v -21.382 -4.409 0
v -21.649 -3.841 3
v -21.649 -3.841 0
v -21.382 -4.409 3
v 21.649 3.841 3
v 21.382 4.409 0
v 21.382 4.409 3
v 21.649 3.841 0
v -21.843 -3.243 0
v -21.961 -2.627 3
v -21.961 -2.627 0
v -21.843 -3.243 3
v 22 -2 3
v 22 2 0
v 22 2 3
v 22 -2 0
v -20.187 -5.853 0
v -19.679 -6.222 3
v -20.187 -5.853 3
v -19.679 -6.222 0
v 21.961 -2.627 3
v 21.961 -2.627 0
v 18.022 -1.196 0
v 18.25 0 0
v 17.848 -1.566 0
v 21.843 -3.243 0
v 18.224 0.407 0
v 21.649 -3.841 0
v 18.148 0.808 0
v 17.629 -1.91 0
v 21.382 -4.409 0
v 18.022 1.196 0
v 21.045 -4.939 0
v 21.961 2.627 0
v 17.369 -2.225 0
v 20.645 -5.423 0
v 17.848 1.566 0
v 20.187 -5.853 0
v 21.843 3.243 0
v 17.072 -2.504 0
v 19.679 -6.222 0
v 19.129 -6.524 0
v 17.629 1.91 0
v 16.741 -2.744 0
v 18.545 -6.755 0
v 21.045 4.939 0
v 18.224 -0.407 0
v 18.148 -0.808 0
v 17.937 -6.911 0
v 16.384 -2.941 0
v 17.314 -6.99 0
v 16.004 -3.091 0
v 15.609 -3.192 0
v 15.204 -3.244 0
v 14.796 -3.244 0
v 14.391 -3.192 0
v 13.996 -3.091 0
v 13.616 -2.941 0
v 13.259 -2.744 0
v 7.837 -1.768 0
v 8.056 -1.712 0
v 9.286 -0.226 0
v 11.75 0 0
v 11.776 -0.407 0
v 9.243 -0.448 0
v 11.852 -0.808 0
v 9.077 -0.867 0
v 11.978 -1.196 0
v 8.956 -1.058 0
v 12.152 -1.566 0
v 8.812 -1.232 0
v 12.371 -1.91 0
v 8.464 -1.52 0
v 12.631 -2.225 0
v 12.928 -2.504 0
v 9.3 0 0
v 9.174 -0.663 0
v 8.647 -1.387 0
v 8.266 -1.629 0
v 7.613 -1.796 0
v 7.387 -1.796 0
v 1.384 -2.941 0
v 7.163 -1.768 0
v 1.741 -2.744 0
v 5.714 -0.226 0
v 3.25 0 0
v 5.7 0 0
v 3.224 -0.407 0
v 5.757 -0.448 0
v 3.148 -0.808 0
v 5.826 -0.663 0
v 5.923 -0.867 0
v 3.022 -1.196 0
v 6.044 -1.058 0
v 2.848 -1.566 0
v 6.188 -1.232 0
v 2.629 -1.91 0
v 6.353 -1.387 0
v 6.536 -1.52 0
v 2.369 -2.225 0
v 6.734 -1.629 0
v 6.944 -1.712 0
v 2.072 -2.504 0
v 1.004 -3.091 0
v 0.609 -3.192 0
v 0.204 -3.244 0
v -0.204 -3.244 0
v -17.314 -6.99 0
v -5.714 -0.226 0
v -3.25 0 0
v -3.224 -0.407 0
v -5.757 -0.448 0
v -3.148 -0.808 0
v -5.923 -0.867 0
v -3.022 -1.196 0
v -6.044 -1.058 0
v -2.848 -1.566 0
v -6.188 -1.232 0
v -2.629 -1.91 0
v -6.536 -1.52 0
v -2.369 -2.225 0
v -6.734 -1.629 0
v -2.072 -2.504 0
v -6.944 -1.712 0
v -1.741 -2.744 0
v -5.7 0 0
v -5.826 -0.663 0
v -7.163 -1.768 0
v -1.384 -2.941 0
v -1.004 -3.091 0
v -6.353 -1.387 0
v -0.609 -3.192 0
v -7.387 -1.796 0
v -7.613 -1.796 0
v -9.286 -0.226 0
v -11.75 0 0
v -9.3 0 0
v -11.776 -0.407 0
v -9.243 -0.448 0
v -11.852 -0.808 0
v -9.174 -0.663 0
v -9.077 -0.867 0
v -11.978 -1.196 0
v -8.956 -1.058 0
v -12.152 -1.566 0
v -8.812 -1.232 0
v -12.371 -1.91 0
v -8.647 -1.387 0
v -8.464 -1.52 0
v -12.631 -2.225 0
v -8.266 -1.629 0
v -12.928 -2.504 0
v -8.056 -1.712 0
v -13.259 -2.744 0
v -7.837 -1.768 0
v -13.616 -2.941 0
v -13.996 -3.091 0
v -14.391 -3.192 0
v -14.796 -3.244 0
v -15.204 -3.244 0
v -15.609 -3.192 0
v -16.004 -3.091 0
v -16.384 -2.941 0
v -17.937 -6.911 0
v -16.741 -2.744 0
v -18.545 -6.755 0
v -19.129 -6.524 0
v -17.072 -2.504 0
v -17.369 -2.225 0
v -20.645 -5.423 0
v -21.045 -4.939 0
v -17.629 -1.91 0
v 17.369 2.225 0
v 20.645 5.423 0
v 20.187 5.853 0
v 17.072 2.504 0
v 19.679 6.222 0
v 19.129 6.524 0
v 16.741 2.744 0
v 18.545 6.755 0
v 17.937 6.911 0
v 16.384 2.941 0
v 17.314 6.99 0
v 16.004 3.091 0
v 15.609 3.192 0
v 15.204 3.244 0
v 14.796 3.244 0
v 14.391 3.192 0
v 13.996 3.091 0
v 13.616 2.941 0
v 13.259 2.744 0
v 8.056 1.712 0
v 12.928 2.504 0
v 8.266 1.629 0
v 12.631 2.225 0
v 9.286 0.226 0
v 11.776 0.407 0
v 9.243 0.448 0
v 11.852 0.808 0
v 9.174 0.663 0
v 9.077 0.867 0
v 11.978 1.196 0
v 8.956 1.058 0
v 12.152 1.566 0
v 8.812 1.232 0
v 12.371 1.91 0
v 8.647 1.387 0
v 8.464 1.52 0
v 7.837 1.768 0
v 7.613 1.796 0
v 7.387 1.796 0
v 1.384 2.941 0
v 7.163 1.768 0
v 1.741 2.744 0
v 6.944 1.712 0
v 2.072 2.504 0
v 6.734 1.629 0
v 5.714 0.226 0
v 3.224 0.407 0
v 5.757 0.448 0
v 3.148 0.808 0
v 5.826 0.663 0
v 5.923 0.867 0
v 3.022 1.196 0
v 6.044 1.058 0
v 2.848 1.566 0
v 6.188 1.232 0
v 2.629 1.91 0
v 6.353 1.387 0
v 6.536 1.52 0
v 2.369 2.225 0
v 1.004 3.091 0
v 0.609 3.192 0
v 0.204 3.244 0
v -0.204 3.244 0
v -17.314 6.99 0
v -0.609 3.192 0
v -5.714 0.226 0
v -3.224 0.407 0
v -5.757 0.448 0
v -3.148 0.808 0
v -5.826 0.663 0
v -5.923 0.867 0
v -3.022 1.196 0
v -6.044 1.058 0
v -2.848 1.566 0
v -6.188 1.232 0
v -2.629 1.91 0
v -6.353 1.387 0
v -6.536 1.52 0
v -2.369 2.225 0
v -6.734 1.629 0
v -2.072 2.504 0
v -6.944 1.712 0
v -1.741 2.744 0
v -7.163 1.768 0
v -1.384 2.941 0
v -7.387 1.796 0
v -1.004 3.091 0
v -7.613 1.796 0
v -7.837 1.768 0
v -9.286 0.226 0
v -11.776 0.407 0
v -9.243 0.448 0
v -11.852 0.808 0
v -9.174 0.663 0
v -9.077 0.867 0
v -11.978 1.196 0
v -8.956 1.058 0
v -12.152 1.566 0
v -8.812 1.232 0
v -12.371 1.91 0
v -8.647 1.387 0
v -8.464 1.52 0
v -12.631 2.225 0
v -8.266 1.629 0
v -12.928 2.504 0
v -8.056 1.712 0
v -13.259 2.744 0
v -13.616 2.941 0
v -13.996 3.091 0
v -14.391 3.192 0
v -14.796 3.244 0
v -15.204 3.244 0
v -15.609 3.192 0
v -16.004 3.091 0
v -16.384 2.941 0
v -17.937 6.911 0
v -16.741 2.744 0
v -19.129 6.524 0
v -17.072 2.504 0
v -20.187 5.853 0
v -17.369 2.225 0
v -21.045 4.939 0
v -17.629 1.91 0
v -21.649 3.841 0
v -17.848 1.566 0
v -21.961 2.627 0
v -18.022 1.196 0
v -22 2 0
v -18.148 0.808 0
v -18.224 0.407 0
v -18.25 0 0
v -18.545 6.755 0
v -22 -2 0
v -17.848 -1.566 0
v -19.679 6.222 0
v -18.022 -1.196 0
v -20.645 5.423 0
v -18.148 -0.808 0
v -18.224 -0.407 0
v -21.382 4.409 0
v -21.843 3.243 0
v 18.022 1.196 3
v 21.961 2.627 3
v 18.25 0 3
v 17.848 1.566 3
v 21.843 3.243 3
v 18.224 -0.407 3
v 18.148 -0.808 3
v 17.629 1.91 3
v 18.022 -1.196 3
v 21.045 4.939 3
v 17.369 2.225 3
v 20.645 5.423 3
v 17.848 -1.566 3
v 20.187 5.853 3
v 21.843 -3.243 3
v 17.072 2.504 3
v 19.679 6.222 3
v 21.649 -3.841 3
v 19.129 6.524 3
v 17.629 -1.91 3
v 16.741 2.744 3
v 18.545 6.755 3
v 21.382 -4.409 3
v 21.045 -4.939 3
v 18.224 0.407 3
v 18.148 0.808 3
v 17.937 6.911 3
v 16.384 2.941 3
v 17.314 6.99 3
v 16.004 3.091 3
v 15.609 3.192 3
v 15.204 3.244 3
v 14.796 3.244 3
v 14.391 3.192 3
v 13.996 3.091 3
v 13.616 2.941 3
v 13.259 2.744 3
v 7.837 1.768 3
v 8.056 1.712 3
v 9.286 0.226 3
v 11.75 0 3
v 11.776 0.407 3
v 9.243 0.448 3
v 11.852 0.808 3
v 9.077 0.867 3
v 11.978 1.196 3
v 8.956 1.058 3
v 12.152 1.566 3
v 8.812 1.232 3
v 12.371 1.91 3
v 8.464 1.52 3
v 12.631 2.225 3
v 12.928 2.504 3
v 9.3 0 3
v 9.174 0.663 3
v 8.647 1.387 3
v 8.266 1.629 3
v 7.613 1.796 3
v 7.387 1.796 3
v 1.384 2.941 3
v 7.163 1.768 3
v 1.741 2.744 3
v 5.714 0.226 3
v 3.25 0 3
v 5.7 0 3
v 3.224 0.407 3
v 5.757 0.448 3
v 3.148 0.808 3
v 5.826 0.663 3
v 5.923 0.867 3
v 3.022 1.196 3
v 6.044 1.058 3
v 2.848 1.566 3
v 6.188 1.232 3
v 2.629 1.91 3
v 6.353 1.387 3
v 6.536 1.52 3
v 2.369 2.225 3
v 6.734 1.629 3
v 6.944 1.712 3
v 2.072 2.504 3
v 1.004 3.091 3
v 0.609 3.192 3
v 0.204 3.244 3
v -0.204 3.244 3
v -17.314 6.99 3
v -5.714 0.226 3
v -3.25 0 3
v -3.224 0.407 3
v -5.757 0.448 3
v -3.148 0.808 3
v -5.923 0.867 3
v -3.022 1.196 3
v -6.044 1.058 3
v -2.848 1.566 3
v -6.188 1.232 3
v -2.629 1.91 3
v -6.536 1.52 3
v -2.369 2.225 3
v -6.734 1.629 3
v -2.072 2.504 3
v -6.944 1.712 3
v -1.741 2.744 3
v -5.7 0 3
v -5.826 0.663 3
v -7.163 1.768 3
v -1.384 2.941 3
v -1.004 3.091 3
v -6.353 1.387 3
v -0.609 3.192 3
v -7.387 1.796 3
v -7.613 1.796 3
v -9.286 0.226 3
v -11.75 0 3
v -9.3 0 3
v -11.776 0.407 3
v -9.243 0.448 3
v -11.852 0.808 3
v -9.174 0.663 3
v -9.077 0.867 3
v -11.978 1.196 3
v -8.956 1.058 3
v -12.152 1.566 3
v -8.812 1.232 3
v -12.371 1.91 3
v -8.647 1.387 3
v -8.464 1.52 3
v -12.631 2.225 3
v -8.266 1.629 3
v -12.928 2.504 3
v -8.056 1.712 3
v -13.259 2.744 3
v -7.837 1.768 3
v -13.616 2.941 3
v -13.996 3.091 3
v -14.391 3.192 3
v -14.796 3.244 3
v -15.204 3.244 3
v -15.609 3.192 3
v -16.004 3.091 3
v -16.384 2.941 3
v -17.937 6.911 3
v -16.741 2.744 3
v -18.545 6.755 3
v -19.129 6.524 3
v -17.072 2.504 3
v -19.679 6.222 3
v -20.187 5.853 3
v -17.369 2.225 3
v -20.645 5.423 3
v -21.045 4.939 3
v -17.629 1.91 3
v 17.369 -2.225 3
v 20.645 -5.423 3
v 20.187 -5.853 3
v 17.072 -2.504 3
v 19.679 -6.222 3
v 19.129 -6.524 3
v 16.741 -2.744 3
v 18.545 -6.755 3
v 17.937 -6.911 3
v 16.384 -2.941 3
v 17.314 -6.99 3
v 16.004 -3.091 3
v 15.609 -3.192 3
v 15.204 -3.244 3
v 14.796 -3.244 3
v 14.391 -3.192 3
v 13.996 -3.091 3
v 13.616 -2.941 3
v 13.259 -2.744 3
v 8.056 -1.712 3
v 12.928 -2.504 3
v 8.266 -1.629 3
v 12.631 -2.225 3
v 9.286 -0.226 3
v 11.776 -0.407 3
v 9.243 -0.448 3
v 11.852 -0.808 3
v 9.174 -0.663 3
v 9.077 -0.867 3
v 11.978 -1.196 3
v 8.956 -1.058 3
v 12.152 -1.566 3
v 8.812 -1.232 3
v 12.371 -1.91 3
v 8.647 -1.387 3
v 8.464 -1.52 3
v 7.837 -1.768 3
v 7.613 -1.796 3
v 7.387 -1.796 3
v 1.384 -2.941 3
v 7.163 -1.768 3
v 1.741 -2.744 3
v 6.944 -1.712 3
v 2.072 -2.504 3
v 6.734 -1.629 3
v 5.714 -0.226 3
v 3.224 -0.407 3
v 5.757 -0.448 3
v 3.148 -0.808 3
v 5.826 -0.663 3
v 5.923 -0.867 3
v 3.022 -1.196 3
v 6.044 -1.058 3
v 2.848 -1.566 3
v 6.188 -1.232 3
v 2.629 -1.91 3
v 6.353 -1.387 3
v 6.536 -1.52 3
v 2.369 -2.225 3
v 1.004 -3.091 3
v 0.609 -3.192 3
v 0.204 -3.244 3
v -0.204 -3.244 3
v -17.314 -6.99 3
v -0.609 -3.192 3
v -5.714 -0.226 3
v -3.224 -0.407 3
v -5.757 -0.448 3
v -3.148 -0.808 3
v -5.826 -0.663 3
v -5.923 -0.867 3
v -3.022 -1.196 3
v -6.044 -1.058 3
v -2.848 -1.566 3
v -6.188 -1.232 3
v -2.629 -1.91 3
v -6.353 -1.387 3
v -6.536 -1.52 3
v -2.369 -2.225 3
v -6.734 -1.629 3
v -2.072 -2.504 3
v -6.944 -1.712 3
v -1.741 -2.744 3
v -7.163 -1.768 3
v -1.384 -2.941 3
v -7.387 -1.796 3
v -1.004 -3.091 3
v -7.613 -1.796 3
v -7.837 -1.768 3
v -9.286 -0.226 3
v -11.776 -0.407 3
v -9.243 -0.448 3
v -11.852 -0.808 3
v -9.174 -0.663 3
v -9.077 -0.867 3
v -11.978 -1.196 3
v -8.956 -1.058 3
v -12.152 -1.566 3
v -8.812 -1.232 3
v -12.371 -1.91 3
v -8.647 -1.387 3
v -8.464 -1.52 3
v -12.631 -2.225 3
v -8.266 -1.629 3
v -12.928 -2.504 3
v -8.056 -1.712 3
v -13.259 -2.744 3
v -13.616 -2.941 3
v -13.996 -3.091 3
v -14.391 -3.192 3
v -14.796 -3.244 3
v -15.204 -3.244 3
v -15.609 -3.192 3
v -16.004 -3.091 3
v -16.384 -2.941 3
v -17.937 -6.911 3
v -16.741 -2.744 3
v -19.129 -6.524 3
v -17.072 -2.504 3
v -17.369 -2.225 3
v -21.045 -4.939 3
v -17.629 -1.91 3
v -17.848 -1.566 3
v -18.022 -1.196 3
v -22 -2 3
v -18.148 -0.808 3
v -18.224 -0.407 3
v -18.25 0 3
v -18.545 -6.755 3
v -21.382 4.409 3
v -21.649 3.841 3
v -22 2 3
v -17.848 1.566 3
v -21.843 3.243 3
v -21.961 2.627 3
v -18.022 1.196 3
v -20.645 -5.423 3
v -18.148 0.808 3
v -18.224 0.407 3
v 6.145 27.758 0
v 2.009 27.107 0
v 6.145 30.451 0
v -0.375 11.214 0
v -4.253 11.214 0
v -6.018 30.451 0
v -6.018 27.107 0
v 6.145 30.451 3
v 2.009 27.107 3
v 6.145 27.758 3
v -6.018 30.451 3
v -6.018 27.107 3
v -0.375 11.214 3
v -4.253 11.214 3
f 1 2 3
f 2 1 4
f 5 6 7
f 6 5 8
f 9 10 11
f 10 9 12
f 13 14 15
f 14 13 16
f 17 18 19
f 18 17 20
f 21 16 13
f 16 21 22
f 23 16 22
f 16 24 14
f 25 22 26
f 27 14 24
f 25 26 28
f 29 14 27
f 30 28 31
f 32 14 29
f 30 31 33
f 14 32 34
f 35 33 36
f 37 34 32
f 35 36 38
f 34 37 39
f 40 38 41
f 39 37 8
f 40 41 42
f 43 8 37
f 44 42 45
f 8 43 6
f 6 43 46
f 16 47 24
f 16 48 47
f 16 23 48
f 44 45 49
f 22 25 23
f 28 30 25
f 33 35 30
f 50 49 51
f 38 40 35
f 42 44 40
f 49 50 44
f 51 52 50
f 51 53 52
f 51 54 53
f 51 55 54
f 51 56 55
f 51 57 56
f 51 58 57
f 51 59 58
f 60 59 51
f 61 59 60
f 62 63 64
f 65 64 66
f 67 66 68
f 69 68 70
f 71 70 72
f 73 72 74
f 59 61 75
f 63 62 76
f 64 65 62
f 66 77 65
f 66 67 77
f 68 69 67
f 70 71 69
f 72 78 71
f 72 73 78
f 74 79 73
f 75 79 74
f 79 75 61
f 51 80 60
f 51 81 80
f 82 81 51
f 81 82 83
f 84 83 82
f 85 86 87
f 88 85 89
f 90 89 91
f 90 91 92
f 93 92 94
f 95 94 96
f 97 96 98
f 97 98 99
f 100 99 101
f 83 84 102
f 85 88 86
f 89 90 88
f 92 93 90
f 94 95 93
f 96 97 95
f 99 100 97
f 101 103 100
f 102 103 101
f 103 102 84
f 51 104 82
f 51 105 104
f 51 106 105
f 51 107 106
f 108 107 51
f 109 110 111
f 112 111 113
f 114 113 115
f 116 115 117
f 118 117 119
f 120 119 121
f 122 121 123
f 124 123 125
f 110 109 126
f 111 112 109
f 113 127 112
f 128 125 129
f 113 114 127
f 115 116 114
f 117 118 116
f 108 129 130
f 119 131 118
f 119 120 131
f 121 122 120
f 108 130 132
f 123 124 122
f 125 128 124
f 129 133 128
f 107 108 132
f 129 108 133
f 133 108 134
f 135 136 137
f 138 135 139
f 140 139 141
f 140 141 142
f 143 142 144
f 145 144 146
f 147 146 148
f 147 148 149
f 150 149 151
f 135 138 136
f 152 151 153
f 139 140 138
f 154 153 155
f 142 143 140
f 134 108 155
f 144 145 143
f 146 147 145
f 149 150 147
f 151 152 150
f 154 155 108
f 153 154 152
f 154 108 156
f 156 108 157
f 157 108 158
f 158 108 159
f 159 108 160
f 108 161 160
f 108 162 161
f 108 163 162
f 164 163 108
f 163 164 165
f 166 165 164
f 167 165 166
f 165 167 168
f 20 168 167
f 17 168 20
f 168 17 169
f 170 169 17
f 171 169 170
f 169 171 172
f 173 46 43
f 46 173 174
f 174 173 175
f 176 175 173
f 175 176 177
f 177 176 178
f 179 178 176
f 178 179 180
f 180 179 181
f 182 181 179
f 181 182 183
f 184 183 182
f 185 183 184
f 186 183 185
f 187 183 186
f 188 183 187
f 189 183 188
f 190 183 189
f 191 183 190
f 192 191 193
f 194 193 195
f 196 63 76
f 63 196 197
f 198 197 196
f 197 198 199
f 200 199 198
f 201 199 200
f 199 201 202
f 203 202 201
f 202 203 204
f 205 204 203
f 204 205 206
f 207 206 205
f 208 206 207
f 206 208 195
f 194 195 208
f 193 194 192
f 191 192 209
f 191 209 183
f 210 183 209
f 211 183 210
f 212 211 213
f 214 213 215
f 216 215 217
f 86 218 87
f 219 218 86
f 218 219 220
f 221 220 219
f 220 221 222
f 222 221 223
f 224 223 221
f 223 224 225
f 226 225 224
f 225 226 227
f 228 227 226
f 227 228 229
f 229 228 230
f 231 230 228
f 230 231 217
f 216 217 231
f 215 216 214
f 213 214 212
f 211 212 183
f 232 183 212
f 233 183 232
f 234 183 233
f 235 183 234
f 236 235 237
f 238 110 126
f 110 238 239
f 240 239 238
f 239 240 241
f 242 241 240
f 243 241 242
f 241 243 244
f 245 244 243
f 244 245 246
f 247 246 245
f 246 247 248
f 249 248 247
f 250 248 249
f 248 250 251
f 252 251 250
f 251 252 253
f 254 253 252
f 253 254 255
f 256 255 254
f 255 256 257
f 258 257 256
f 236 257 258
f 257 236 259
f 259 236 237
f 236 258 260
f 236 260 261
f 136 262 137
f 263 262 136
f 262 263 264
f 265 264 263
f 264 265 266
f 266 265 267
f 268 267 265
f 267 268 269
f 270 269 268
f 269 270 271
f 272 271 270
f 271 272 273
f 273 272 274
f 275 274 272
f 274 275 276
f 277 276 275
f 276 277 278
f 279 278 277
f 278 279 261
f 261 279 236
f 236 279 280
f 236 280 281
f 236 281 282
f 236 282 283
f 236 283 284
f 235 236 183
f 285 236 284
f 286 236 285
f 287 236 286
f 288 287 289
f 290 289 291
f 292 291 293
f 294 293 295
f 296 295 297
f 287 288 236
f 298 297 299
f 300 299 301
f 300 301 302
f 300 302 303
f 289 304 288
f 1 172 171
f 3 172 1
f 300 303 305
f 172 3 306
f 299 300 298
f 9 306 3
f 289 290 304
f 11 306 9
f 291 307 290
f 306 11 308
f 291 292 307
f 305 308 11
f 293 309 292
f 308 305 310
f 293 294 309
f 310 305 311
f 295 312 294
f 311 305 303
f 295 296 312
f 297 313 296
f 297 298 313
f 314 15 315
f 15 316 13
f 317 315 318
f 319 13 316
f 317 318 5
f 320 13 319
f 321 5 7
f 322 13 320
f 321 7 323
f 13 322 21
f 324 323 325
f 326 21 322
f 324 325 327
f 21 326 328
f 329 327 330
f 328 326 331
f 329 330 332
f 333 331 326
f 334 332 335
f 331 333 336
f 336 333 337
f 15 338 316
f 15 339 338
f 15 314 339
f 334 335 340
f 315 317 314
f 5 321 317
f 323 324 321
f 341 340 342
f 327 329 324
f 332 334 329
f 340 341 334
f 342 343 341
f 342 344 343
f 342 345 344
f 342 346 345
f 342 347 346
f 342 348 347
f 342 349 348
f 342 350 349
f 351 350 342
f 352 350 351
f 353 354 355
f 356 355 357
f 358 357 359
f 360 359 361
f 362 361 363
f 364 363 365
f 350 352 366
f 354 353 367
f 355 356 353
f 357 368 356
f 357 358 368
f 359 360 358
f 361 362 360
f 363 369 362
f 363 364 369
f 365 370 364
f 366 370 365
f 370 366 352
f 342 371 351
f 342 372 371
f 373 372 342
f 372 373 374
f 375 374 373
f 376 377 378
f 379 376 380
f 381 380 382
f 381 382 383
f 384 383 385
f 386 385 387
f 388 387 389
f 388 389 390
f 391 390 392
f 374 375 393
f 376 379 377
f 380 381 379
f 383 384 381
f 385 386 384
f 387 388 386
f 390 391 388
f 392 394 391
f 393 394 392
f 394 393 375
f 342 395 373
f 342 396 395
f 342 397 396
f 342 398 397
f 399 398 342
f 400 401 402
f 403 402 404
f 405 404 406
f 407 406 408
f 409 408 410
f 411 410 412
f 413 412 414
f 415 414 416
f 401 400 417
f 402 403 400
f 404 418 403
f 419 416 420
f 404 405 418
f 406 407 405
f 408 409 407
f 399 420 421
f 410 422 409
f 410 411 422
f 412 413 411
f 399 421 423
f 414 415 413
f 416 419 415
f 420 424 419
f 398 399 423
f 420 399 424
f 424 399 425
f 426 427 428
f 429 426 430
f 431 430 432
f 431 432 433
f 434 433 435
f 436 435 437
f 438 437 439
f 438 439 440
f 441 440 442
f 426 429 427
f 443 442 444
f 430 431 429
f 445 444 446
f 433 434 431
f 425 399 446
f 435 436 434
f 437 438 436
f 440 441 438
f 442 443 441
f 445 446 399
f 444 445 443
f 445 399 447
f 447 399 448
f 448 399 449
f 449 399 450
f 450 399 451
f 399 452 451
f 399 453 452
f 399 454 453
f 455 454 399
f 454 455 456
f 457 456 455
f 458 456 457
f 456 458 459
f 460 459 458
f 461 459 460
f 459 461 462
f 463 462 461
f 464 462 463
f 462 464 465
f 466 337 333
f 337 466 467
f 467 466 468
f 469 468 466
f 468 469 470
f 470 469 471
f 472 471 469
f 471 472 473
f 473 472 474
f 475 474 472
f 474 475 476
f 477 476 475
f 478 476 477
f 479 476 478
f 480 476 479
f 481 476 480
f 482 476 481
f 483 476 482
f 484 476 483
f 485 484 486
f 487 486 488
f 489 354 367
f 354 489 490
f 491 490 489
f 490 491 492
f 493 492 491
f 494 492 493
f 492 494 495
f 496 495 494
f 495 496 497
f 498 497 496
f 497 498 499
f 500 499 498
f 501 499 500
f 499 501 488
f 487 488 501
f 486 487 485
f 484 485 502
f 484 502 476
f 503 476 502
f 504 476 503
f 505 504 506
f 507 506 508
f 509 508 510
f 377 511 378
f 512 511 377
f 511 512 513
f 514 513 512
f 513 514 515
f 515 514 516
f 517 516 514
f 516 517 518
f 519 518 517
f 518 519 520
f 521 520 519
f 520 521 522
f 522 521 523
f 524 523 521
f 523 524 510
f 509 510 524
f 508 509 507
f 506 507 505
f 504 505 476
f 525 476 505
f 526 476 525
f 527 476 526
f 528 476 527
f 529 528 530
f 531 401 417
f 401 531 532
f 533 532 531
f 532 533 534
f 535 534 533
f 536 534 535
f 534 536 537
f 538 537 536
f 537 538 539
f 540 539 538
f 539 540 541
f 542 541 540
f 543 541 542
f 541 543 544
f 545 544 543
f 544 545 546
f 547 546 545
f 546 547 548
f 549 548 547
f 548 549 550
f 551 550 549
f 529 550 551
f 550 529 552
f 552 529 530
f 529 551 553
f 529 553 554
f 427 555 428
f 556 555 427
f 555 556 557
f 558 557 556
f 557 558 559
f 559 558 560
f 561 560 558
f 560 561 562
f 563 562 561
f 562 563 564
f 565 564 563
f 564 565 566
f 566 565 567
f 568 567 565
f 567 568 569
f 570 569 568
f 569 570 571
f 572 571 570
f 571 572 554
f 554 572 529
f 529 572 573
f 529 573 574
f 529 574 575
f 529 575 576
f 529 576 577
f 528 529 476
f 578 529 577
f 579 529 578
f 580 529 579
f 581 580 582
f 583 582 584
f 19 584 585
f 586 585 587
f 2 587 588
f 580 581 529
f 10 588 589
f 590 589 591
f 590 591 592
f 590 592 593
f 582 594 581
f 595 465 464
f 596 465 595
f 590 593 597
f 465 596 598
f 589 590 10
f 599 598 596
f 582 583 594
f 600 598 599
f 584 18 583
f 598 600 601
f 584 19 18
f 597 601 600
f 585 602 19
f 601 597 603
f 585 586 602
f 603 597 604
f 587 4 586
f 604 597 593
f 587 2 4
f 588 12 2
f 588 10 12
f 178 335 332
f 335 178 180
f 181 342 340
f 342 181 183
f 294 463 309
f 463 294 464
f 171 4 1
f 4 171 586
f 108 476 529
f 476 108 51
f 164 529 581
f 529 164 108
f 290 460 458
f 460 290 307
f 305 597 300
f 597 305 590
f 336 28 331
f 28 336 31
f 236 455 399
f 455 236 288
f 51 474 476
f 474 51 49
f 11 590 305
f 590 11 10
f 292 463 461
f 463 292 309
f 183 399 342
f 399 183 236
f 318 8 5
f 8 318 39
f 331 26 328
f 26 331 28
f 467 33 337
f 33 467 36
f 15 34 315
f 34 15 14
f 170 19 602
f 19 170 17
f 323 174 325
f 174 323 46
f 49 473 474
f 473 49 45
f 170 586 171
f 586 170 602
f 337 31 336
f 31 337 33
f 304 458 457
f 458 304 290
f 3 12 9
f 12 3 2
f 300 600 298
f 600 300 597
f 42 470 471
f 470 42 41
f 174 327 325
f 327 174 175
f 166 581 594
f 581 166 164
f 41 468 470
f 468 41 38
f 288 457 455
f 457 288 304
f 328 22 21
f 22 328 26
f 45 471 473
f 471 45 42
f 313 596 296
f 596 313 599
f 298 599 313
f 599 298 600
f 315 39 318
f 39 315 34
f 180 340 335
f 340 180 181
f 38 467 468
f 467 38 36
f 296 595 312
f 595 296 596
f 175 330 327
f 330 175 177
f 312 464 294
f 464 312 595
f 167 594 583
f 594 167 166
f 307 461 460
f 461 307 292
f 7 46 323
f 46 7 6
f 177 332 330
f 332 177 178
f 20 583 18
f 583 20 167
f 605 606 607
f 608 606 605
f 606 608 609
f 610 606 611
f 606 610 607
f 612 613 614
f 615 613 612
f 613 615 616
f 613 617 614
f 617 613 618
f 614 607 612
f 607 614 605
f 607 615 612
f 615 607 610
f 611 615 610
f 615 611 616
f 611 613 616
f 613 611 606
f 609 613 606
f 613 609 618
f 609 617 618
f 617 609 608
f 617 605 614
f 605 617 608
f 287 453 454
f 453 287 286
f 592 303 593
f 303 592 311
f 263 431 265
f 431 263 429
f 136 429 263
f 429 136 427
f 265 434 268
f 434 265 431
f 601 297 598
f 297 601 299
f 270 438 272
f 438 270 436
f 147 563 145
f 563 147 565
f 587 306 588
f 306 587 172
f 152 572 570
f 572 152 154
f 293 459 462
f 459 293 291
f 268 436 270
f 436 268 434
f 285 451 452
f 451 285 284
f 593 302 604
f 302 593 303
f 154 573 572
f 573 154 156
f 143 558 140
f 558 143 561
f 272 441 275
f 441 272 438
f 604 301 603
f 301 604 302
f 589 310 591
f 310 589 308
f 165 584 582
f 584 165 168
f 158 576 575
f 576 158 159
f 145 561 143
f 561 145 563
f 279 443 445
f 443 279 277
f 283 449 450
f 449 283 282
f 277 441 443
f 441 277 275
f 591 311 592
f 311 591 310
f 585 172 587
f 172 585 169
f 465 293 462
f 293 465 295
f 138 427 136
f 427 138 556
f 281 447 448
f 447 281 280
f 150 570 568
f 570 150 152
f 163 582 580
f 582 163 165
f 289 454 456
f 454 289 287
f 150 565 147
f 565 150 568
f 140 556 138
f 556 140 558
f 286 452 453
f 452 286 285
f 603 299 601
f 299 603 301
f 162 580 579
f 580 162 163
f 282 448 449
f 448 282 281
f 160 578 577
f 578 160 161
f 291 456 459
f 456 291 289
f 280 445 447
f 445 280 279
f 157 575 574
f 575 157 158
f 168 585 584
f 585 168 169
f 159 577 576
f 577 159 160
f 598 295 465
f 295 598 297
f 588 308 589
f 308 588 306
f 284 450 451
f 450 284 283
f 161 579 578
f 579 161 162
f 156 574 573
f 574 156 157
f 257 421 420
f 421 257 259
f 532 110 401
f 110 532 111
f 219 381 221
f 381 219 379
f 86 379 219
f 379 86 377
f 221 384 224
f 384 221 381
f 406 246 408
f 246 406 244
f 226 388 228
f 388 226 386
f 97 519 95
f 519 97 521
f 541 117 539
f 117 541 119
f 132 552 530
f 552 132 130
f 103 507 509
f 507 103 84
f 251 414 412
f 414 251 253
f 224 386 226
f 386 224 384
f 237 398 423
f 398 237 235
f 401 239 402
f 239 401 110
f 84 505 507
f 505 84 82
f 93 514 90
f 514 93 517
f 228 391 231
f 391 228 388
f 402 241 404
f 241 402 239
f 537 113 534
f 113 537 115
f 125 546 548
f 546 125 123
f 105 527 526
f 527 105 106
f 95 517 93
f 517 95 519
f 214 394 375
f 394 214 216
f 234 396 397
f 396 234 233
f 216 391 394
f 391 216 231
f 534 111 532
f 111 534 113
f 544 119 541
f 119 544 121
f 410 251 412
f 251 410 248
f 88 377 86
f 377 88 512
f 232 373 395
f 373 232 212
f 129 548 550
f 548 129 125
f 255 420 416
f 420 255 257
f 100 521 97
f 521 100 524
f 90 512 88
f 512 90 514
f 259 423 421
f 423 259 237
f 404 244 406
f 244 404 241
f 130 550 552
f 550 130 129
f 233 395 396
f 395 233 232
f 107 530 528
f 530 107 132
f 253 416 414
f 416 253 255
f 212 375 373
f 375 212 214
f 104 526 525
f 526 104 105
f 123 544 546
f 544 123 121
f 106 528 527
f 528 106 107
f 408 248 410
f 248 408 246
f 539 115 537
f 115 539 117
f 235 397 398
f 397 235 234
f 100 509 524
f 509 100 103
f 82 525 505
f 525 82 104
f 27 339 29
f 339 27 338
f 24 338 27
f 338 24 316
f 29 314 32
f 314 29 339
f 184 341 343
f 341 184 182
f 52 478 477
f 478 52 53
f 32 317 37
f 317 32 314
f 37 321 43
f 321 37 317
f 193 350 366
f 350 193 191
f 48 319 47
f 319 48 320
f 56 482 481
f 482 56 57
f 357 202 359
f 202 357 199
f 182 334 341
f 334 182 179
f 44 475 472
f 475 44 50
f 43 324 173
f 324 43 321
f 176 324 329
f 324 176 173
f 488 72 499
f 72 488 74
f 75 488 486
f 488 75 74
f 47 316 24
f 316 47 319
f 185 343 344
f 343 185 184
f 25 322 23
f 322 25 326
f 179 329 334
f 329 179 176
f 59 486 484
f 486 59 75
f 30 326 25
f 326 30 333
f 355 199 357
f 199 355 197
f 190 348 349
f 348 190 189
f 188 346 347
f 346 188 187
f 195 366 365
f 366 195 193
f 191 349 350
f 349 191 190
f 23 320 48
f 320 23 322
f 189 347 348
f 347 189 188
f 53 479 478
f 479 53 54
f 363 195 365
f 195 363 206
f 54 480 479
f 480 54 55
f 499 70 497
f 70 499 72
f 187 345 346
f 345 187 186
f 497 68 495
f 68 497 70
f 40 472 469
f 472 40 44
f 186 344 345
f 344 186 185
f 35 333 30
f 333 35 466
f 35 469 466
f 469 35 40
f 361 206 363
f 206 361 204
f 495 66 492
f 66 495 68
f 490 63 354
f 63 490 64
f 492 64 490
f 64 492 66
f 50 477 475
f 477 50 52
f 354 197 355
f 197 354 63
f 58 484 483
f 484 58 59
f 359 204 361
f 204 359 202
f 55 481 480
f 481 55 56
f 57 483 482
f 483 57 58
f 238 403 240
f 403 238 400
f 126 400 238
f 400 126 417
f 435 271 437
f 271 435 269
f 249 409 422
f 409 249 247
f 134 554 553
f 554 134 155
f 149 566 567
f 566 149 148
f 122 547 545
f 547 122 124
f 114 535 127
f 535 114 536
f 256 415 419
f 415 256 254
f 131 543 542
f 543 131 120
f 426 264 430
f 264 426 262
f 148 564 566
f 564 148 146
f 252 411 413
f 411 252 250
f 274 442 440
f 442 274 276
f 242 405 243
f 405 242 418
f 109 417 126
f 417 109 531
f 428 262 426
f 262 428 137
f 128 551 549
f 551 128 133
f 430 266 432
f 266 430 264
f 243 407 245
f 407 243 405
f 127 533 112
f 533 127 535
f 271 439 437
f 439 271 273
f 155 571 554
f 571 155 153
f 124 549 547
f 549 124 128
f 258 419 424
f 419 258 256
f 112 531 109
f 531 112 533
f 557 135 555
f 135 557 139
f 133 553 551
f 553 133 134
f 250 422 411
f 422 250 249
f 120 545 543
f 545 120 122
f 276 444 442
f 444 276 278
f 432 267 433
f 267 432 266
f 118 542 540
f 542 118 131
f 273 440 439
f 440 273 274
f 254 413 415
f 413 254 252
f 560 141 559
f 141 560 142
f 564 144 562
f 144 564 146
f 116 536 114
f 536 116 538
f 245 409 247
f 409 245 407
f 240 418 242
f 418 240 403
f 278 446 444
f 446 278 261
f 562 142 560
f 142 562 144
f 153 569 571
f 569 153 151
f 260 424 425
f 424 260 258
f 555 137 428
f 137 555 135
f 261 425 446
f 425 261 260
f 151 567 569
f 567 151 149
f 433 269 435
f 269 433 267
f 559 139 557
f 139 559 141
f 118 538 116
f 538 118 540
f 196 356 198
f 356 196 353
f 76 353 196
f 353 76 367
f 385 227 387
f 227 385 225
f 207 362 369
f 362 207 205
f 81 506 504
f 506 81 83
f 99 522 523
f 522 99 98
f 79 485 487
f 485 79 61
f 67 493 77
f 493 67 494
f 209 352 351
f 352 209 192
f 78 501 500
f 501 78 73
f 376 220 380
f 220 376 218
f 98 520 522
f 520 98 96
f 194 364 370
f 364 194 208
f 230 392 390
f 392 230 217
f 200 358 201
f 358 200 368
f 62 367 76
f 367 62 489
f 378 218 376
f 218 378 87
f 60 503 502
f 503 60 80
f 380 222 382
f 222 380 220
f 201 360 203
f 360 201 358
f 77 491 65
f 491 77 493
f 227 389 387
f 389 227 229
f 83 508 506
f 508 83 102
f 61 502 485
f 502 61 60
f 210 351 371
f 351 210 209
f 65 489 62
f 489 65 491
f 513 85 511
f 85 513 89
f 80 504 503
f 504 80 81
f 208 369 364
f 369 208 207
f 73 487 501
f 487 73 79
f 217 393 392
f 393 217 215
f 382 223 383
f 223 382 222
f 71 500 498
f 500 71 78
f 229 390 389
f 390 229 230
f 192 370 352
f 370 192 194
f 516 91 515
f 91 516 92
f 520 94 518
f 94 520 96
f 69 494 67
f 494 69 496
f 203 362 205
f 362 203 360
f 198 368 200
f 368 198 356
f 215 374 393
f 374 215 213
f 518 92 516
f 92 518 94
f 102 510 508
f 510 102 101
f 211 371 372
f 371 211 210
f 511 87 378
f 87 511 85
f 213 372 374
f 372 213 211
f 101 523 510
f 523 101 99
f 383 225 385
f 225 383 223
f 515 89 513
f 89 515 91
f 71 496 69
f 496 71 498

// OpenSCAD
$fn = 50;


difference() {
	union() {
		hull() {
			translate(v = [-17.0000000000, 2.0000000000, 0]) {
				cylinder(h = 3, r = 5);
			}
			translate(v = [17.0000000000, 2.0000000000, 0]) {
				cylinder(h = 3, r = 5);
			}
			translate(v = [-17.0000000000, -2.0000000000, 0]) {
				cylinder(h = 3, r = 5);
			}
			translate(v = [17.0000000000, -2.0000000000, 0]) {
				cylinder(h = 3, r = 5);
			}
		}
		translate(v = [0, 30.0000000000, 0]) {
			linear_extrude(height = 3) {
				text(font = "DejaVu Sans Mono:style=Bold", halign = "center", size = 19.0000000000, text = "7", valign = "top");
			}
		}
	}
	union() {
		translate(v = [-15.0000000000, 0.0000000000, 0]) {
			translate(v = [0, 0, -100]) {
				cylinder(h = 200, r = 3.2500000000);
			}
		}
		translate(v = [0, 0, -100]) {
			cylinder(h = 200, r = 3.2500000000);
		}
		translate(v = [15.0000000000, 0.0000000000, 0]) {
			translate(v = [0, 0, -100]) {
				cylinder(h = 200, r = 3.2500000000);
			}
		}
		translate(v = [-15.0000000000, 0.0000000000, 0]) {
			translate(v = [0, 0, -100]) {
				cylinder(h = 200, r = 1.8000000000);
			}
		}
		translate(v = [-7.5000000000, 0.0000000000, 0]) {
			translate(v = [0, 0, -100]) {
				cylinder(h = 200, r = 1.8000000000);
			}
		}
		translate(v = [0, 0, -100]) {
			cylinder(h = 200, r = 1.8000000000);
		}
		translate(v = [7.5000000000, 0.0000000000, 0]) {
			translate(v = [0, 0, -100]) {
				cylinder(h = 200, r = 1.8000000000);
			}
		}
		translate(v = [15.0000000000, 0.0000000000, 0]) {
			translate(v = [0, 0, -100]) {
				cylinder(h = 200, r = 1.8000000000);
			}
		}
	}
}
